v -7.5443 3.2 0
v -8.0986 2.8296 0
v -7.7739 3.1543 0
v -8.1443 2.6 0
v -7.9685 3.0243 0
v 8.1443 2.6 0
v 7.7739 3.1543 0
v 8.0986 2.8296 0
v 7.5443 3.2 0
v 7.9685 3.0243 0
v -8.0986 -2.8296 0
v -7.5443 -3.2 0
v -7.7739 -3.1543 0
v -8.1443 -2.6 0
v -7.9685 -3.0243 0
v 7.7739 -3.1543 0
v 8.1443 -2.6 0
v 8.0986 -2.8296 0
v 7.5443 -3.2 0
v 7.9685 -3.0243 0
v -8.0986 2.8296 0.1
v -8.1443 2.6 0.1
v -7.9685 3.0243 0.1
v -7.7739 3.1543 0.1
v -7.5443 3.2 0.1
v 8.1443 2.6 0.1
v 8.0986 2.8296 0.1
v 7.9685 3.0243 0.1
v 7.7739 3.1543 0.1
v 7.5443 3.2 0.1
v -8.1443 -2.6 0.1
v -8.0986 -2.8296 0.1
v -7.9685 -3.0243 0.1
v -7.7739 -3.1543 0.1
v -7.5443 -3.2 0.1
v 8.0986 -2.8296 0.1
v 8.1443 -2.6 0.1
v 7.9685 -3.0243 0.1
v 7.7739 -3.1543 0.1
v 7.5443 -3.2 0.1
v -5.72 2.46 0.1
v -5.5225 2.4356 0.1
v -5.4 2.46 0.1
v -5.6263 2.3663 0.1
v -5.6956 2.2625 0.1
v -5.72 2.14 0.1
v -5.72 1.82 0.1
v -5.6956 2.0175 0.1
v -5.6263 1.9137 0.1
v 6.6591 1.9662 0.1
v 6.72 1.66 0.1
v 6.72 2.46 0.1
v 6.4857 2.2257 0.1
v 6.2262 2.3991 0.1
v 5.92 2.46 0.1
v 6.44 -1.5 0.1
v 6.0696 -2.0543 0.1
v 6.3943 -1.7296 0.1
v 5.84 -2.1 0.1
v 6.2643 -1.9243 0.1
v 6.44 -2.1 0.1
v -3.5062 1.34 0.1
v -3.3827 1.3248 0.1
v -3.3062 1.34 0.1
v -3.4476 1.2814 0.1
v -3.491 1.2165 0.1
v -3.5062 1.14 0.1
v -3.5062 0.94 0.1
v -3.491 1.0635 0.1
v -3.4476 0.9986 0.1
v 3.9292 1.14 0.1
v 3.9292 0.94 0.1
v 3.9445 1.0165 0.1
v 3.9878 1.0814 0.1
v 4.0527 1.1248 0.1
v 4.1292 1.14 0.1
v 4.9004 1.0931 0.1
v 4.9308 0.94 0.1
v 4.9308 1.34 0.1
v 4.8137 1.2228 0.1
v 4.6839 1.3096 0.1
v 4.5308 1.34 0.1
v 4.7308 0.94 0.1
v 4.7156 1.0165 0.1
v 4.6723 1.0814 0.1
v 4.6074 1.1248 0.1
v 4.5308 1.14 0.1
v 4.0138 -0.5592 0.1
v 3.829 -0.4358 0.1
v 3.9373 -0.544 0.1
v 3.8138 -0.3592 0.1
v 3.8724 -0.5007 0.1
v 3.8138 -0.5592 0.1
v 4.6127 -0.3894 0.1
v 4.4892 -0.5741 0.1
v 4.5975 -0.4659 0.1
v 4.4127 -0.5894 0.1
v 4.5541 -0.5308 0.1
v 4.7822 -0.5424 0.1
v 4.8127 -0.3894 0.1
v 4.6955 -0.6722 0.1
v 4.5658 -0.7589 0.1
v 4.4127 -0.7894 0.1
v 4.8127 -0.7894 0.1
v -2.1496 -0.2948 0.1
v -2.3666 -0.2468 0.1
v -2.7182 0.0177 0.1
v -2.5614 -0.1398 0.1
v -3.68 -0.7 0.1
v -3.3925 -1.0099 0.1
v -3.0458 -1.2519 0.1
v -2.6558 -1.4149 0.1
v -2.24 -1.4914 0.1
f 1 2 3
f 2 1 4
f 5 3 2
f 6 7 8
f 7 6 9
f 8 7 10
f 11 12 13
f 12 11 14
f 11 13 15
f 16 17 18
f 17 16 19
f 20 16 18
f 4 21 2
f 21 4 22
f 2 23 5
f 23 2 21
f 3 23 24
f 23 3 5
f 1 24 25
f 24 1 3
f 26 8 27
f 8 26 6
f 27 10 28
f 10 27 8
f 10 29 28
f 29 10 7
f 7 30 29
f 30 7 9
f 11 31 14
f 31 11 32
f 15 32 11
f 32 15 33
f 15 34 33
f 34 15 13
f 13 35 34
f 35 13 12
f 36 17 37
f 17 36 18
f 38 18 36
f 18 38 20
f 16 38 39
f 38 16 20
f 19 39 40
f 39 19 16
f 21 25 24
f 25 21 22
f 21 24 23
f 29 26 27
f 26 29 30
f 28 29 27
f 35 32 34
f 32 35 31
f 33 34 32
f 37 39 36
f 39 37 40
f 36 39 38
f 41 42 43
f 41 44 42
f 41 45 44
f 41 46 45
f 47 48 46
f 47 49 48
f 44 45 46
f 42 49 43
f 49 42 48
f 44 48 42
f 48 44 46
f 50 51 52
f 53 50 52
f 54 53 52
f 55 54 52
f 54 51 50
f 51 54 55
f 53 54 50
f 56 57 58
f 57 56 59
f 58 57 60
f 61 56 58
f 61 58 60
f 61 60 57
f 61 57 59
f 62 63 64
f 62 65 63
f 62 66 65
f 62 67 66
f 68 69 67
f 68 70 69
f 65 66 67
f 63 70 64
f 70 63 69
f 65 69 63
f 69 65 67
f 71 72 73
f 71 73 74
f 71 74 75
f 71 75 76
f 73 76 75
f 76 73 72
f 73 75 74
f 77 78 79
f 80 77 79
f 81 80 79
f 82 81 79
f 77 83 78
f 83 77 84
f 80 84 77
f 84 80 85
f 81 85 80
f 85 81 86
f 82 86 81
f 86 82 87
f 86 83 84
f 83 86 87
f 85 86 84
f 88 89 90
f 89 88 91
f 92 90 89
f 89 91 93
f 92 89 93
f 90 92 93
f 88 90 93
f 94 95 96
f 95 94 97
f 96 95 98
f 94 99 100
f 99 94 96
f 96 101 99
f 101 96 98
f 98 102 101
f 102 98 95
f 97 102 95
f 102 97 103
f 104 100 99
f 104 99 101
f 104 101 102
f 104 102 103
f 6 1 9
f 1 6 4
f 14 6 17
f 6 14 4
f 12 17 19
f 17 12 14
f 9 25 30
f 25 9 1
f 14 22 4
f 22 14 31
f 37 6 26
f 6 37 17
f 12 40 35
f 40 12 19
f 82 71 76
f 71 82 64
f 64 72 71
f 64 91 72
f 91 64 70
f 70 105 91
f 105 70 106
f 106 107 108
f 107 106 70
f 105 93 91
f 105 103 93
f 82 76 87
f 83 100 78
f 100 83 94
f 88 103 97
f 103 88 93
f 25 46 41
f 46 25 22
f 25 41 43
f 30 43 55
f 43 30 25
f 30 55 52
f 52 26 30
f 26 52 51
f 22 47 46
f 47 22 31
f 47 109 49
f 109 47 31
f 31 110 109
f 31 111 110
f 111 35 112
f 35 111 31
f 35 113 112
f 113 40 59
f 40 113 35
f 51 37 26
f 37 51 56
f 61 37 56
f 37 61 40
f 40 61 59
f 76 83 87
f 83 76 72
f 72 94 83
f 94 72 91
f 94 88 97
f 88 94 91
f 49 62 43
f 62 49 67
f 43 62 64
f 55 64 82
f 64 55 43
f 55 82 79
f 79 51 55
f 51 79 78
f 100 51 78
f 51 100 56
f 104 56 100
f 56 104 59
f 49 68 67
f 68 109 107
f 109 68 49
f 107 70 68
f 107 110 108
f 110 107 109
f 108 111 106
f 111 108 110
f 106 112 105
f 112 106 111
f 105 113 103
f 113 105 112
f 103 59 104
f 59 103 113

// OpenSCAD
// file: ../p/3-8ndis.scad
use <../lib.scad>
function ldraw_lib__3_8ndis() = [
// 0 Disc Negative 0.375
// 0 Name: 3-8ndis.dat
// 0 Author: Alex Taylor [anathema]
// 0 !LDRAW_ORG Primitive UPDATE 2009-02
// 0 !LICENSE Licensed under CC BY 2.0 and CC BY 4.0 : see CAreadme.txt
// 
// 0 BFC CERTIFY CCW
  [0,"BFC","CERTIFY"],
  [0,"BFC","CCW"],
// 
// 0 !HISTORY 2009-09-03 [PTadmin] Official Update 2009-02
// 
// 
// 3 16 1 0 1 0.9239 0 0.3827 1 0 0
  [3,16,1,0,1,0.9239,0,0.3827,1,0,0],
// 3 16 1 0 1 0.7071 0 0.7071 0.9239 0 0.3827
  [3,16,1,0,1,0.7071,0,0.7071,0.9239,0,0.3827],
// 3 16 1 0 1 0.3827 0 0.9239 0.7071 0 0.7071
  [3,16,1,0,1,0.3827,0,0.9239,0.7071,0,0.7071],
// 3 16 1 0 1 0 0 1 0.3827 0 0.9239
  [3,16,1,0,1,0,0,1,0.3827,0,0.9239],
// 3 16 -1 0 1 -0.3827 0 0.9239 0 0 1
  [3,16,-1,0,1,-0.3827,0,0.9239,0,0,1],
// 3 16 -1 0 1 -0.7071 0 0.7071 -0.3827 0 0.9239
  [3,16,-1,0,1,-0.7071,0,0.7071,-0.3827,0,0.9239],
// 0
];
makepoly(ldraw_lib__3_8ndis(), line=0.2);
// file: ../p/3-8chrd.scad
use <../lib.scad>
function ldraw_lib__3_8chrd() = [
// 0 Chord 0.375
// 0 Name: 3-8chrd.dat
// 0 Author: Donald Sutter [technog]
// 0 !LDRAW_ORG Primitive UPDATE 2005-01
// 0 !LICENSE Licensed under CC BY 2.0 and CC BY 4.0 : see CAreadme.txt
// 
// 0 BFC CERTIFY CCW
  [0,"BFC","CERTIFY"],
  [0,"BFC","CCW"],
// 
// 0 !HISTORY 2004-01-07 [Steffen] added primitive code for POVray
// 0 !HISTORY 2004-03-18 [mkennedy] removed pov code and rearanged polygons.
// 0 !HISTORY 2004-09-12 [cwdee] reversed winding and standardised precision
// 0 !HISTORY 2005-12-28 [PTadmin] Official Update 2005-01
// 0 !HISTORY 2007-06-24 [PTadmin] Header formatted for Contributor Agreement
// 0 !HISTORY 2008-07-01 [PTadmin] Official Update 2008-01
// 
// 
// 3 16 0.7071 0 0.7071 0.3827 0 0.9239 0 0 1
  [3,16,0.7071,0,0.7071,0.3827,0,0.9239,0,0,1],
// 4 16 0.9239 0 0.3827 -0.3827 0 0.9239 -0.7071 0 0.7071 1 0 0
  [4,16,0.9239,0,0.3827,-0.3827,0,0.9239,-0.7071,0,0.7071,1,0,0],
// 4 16 0.7071 0 0.7071 0 0 1 -0.3827 0 0.9239 0.9239 0 0.3827
  [4,16,0.7071,0,0.7071,0,0,1,-0.3827,0,0.9239,0.9239,0,0.3827],
// 0
];
makepoly(ldraw_lib__3_8chrd(), line=0.2);
// file: ../p/1-4ring1.scad
use <../lib.scad>
function ldraw_lib__1_4ring1() = [
// 0 Ring  1 x 0.25
// 0 Name: 1-4ring1.dat
// 0 Author: Chris Dee [cwdee]
// 0 !LDRAW_ORG Primitive UPDATE 2012-01
// 0 !LICENSE Licensed under CC BY 2.0 and CC BY 4.0 : see CAreadme.txt
// 
// 0 BFC CERTIFY CCW
  [0,"BFC","CERTIFY"],
  [0,"BFC","CCW"],
// 
// 0 !HISTORY 2000-05-07 [PTadmin] Official Update 2000-01
// 0 !HISTORY 2002-11-22 [hafhead] Added BFC statement
// 0 !HISTORY 2002-11-30 [PTadmin] Official Update 2002-05
// 0 !HISTORY 2007-06-22 [PTadmin] Header formatted for Contributor Agreement
// 0 !HISTORY 2008-07-01 [PTadmin] Official Update 2008-01
// 0 !HISTORY 2012-02-16 [Philo] Changed to CCW
// 0 !HISTORY 2012-03-30 [PTadmin] Official Update 2012-01
// 
// 
// 4 16 2 0 0 1.8478 0 0.7654 0.9239 0 0.3827 1 0 0
  [4,16,2,0,0,1.8478,0,0.7654,0.9239,0,0.3827,1,0,0],
// 4 16 1.8478 0 0.7654 1.4142 0 1.4142 0.7071 0 0.7071 0.9239 0 0.3827
  [4,16,1.8478,0,0.7654,1.4142,0,1.4142,0.7071,0,0.7071,0.9239,0,0.3827],
// 4 16 1.4142 0 1.4142 0.7654 0 1.8478 0.3827 0 0.9239 0.7071 0 0.7071
  [4,16,1.4142,0,1.4142,0.7654,0,1.8478,0.3827,0,0.9239,0.7071,0,0.7071],
// 4 16 0.7654 0 1.8478 0 0 2 0 0 1 0.3827 0 0.9239
  [4,16,0.7654,0,1.8478,0,0,2,0,0,1,0.3827,0,0.9239],
];
makepoly(ldraw_lib__1_4ring1(), line=0.2);
// file: ../p/1-4ndis.scad
use <../lib.scad>
function ldraw_lib__1_4ndis() = [
// 0 Disc Negative 0.25
// 0 Name: 1-4ndis.dat
// 0 Author: James Jessiman
// 0 !LDRAW_ORG Primitive UPDATE 2012-01
// 0 !LICENSE Licensed under CC BY 2.0 and CC BY 4.0 : see CAreadme.txt
// 
// 0 BFC CERTIFY CCW
  [0,"BFC","CERTIFY"],
  [0,"BFC","CCW"],
// 
// 0 !HISTORY 2002-03-23 [sbliss] Added BFC Statement
// 0 !HISTORY 2002-04-25 [PTadmin] Official Update 2002-02
// 0 !HISTORY 2007-06-22 [PTadmin] Header formatted for Contributor Agreement
// 0 !HISTORY 2008-07-01 [PTadmin] Official Update 2008-01
// 0 !HISTORY 2012-02-16 [Philo] Changed to CCW
// 0 !HISTORY 2012-03-30 [PTadmin] Official Update 2012-01
// 
// 
// 3 16 0.9239 0 0.3827 1 0 0 1 0 1
  [3,16,0.9239,0,0.3827,1,0,0,1,0,1],
// 3 16 0.7071 0 0.7071 0.9239 0 0.3827 1 0 1
  [3,16,0.7071,0,0.7071,0.9239,0,0.3827,1,0,1],
// 3 16 0.3827 0 0.9239 0.7071 0 0.7071 1 0 1
  [3,16,0.3827,0,0.9239,0.7071,0,0.7071,1,0,1],
// 3 16 0 0 1 0.3827 0 0.9239 1 0 1
  [3,16,0,0,1,0.3827,0,0.9239,1,0,1],
];
makepoly(ldraw_lib__1_4ndis(), line=0.2);
// file: ../p/1-4cyli.scad
use <../lib.scad>
function ldraw_lib__1_4cyli() = [
// 0 Cylinder 0.25
// 0 Name: 1-4cyli.dat
// 0 Author: James Jessiman
// 0 !LDRAW_ORG Primitive UPDATE 2012-01
// 0 !LICENSE Licensed under CC BY 2.0 and CC BY 4.0 : see CAreadme.txt
// 
// 0 BFC CERTIFY CCW
  [0,"BFC","CERTIFY"],
  [0,"BFC","CCW"],
// 
// 0 !HISTORY 2002-03-23 [sbliss] Added BFC statement.
// 0 !HISTORY 2002-04-25 [PTadmin] Official Update 2002-02
// 0 !HISTORY 2007-06-22 [PTadmin] Header formatted for Contributor Agreement
// 0 !HISTORY 2008-07-01 [PTadmin] Official Update 2008-01
// 0 !HISTORY 2012-02-16 [Philo] Changed to CCW
// 0 !HISTORY 2012-03-30 [PTadmin] Official Update 2012-01
// 
// 
// 4 16 1 1 0 0.9239 1 0.3827 0.9239 0 0.3827 1 0 0
  [4,16,1,1,0,0.9239,1,0.3827,0.9239,0,0.3827,1,0,0],
// 5 24 1 0 0 1 1 0 0.9239 0 0.3827 1 0 -1
  [5,24,1,0,0,1,1,0,0.9239,0,0.3827,1,0,-1],
// 4 16 0.9239 1 0.3827 0.7071 1 0.7071 0.7071 0 0.7071 0.9239 0 0.3827
  [4,16,0.9239,1,0.3827,0.7071,1,0.7071,0.7071,0,0.7071,0.9239,0,0.3827],
// 5 24 0.9239 0 0.3827 0.9239 1 0.3827 0.7071 0 0.7071 1 0 0
  [5,24,0.9239,0,0.3827,0.9239,1,0.3827,0.7071,0,0.7071,1,0,0],
// 4 16 0.7071 1 0.7071 0.3827 1 0.9239 0.3827 0 0.9239 0.7071 0 0.7071
  [4,16,0.7071,1,0.7071,0.3827,1,0.9239,0.3827,0,0.9239,0.7071,0,0.7071],
// 5 24 0.7071 0 0.7071 0.7071 1 0.7071 0.3827 0 0.9239 0.9239 0 0.3827
  [5,24,0.7071,0,0.7071,0.7071,1,0.7071,0.3827,0,0.9239,0.9239,0,0.3827],
// 4 16 0.3827 1 0.9239 0 1 1 0 0 1 0.3827 0 0.9239
  [4,16,0.3827,1,0.9239,0,1,1,0,0,1,0.3827,0,0.9239],
// 5 24 0.3827 0 0.9239 0.3827 1 0.9239 0 0 1 0.7071 0 0.7071
  [5,24,0.3827,0,0.9239,0.3827,1,0.9239,0,0,1,0.7071,0,0.7071],
// 5 24 0 0 1 0 1 1 0.3827 0 0.9239 -1 0 1
  [5,24,0,0,1,0,1,1,0.3827,0,0.9239,-1,0,1],
];
makepoly(ldraw_lib__1_4cyli(), line=0.2);
// file: ../p/1-4chrd.scad
use <../lib.scad>
function ldraw_lib__1_4chrd() = [
// 0 Chord 0.25
// 0 Name: 1-4chrd.dat
// 0 Author: Tony Hafner [hafhead]
// 0 !LDRAW_ORG Primitive UPDATE 2012-02
// 0 !LICENSE Licensed under CC BY 2.0 and CC BY 4.0 : see CAreadme.txt
// 
// 0 BFC CERTIFY CCW
  [0,"BFC","CERTIFY"],
  [0,"BFC","CCW"],
// 
// 0 !HISTORY 2004-04-22 [PTadmin] Official Update 2004-02
// 0 !HISTORY 2007-10-09 [PTadmin] Header formatted for Contributor Agreement
// 0 !HISTORY 2008-07-01 [PTadmin] Official Update 2008-01
// 0 !HISTORY 2012-08-02 [MMR1988] Re-creation with PrimGen2 and Rectifier
// 0 !HISTORY 2012-08-09 [PTadmin] Official Update 2012-02
// 
// 
// 4 16 0.9239 0 0.3827 0.3827 0 0.9239 0 0 1 1 0 0
  [4,16,0.9239,0,0.3827,0.3827,0,0.9239,0,0,1,1,0,0],
// 3 16 0.7071 0 0.7071 0.3827 0 0.9239 0.9239 0 0.3827
  [3,16,0.7071,0,0.7071,0.3827,0,0.9239,0.9239,0,0.3827],
];
makepoly(ldraw_lib__1_4chrd(), line=0.2);
// main file
use <../lib.scad>
use <../p/1-4chrd.scad>
use <../p/1-4cyli.scad>
use <../p/1-4ndis.scad>
use <../p/1-4ring1.scad>
use <../p/3-8chrd.scad>
use <../p/3-8ndis.scad>
function ldraw_lib__6141875h() = [
// 0 Sticker  0.8 x  2.0 with Dark Bluish Grey Air Vent on Black Background Right
// 0 Name: 6141875h.dat
// 0 Author: Massimo Maso [Sirio]
// 0 !LDRAW_ORG Part UPDATE 2022-06
// 0 !LICENSE Licensed under CC BY 2.0 and CC BY 4.0 : see CAreadme.txt
// 
// 0 BFC CERTIFY CCW
  [0,"BFC","CERTIFY"],
  [0,"BFC","CCW"],
// 
// 0 !KEYWORDS Bricklink 75875stk01, Brickowl 53567, F-150, Ford, Raptor
// 0 !KEYWORDS Rebrickable 24760, Set 75875, Speed Champions
// 
// 0 !HISTORY 2022-12-20 [PTadmin] Official Update 2022-06
// 
// 
// 0 // Primitives
// 
// 1 16 -18.8607 0 6.5 -1.5 0 0 0 -1 0 0 0 1.5 1-4chrd.dat
  [1,16,-18.8607,0,6.5,-1.5,0,0,0,-1,0,0,0,1.5, ldraw_lib__1_4chrd()],
// 1 16 18.8607 0 6.5 1.5 0 0 0 -1 0 0 0 1.5 1-4chrd.dat
  [1,16,18.8607,0,6.5,1.5,0,0,0,-1,0,0,0,1.5, ldraw_lib__1_4chrd()],
// 1 16 -18.8607 0 -6.5 -1.5 0 0 0 -1 0 0 0 -1.5 1-4chrd.dat
  [1,16,-18.8607,0,-6.5,-1.5,0,0,0,-1,0,0,0,-1.5, ldraw_lib__1_4chrd()],
// 1 16 18.8607 0 -6.5 1.5 0 0 0 -1 0 0 0 -1.5 1-4chrd.dat
  [1,16,18.8607,0,-6.5,1.5,0,0,0,-1,0,0,0,-1.5, ldraw_lib__1_4chrd()],
// 1 16 -18.8607 0 6.5 -1.5 0 0 0 -.25 0 0 0 1.5 1-4cyli.dat
  [1,16,-18.8607,0,6.5,-1.5,0,0,0,-.25,0,0,0,1.5, ldraw_lib__1_4cyli()],
// 1 16 18.8607 0 6.5 1.5 0 0 0 -.25 0 0 0 1.5 1-4cyli.dat
  [1,16,18.8607,0,6.5,1.5,0,0,0,-.25,0,0,0,1.5, ldraw_lib__1_4cyli()],
// 1 16 -18.8607 0 -6.5 -1.5 0 0 0 -.25 0 0 0 -1.5 1-4cyli.dat
  [1,16,-18.8607,0,-6.5,-1.5,0,0,0,-.25,0,0,0,-1.5, ldraw_lib__1_4cyli()],
// 1 16 18.8607 0 -6.5 1.5 0 0 0 -.25 0 0 0 -1.5 1-4cyli.dat
  [1,16,18.8607,0,-6.5,1.5,0,0,0,-.25,0,0,0,-1.5, ldraw_lib__1_4cyli()],
// 1 0 -18.8607 -.25 6.5 -1.5 0 0 0 1 0 0 0 1.5 1-4chrd.dat
  [1,0,-18.8607,-.25,6.5,-1.5,0,0,0,1,0,0,0,1.5, ldraw_lib__1_4chrd()],
// 1 0 18.8607 -.25 6.5 1.5 0 0 0 1 0 0 0 1.5 1-4chrd.dat
  [1,0,18.8607,-.25,6.5,1.5,0,0,0,1,0,0,0,1.5, ldraw_lib__1_4chrd()],
// 1 0 -18.8607 -.25 -6.5 -1.5 0 0 0 1 0 0 0 -1.5 1-4chrd.dat
  [1,0,-18.8607,-.25,-6.5,-1.5,0,0,0,1,0,0,0,-1.5, ldraw_lib__1_4chrd()],
// 1 0 18.8607 -.25 -6.5 1.5 0 0 0 1 0 0 0 -1.5 1-4chrd.dat
  [1,0,18.8607,-.25,-6.5,1.5,0,0,0,1,0,0,0,-1.5, ldraw_lib__1_4chrd()],
// 1 0 -13.5 -.25 5.35 0 0 -.8 0 1 0 .8 0 0 3-8ndis.dat
  [1,0,-13.5,-.25,5.35,0,0,-.8,0,1,0,.8,0,0, ldraw_lib__3_8ndis()],
// 1 72 -13.5 -.25 5.35 0 0 -.8 0 1 0 .8 0 0 3-8chrd.dat
  [1,72,-13.5,-.25,5.35,0,0,-.8,0,1,0,.8,0,0, ldraw_lib__3_8chrd()],
// 1 0 14.8 -.25 4.15 2 0 0 0 1 0 0 0 2 1-4ndis.dat
  [1,0,14.8,-.25,4.15,2,0,0,0,1,0,0,0,2, ldraw_lib__1_4ndis()],
// 1 72 14.8 -.25 4.15 2 0 0 0 1 0 0 0 2 1-4chrd.dat
  [1,72,14.8,-.25,4.15,2,0,0,0,1,0,0,0,2, ldraw_lib__1_4chrd()],
// 1 72 14.6 -.25 -3.75 1.5 0 0 0 1 0 0 0 -1.5 1-4chrd.dat
  [1,72,14.6,-.25,-3.75,1.5,0,0,0,1,0,0,0,-1.5, ldraw_lib__1_4chrd()],
// 1 0 14.6 -.25 -3.75 1.5 0 0 0 1 0 0 0 -1.5 1-4ndis.dat
  [1,0,14.6,-.25,-3.75,1.5,0,0,0,1,0,0,0,-1.5, ldraw_lib__1_4ndis()],
// 1 72 -8.2655 -.25 2.85 0 0 -.5 0 1 0 .5 0 0 3-8ndis.dat
  [1,72,-8.2655,-.25,2.85,0,0,-.5,0,1,0,.5,0,0, ldraw_lib__3_8ndis()],
// 1 0 -8.2655 -.25 2.85 0 0 -.5 0 1 0 .5 0 0 3-8chrd.dat
  [1,0,-8.2655,-.25,2.85,0,0,-.5,0,1,0,.5,0,0, ldraw_lib__3_8chrd()],
// 1 0 10.3231 -.25 2.35 -.5 0 0 0 1 0 0 0 .5 1-4ndis.dat
  [1,0,10.3231,-.25,2.35,-.5,0,0,0,1,0,0,0,.5, ldraw_lib__1_4ndis()],
// 1 72 10.3231 -.25 2.35 -.5 0 0 0 1 0 0 0 .5 1-4chrd.dat
  [1,72,10.3231,-.25,2.35,-.5,0,0,0,1,0,0,0,.5, ldraw_lib__1_4chrd()],
// 1 72 11.3271 -.25 2.35 1 0 0 0 1 0 0 0 1 1-4ndis.dat
  [1,72,11.3271,-.25,2.35,1,0,0,0,1,0,0,0,1, ldraw_lib__1_4ndis()],
// 1 0 11.3271 -.25 2.35 .5 0 0 0 1 0 0 0 .5 1-4ring1.dat
  [1,0,11.3271,-.25,2.35,.5,0,0,0,1,0,0,0,.5, ldraw_lib__1_4ring1()],
// 1 72 11.3271 -.25 2.35 .5 0 0 0 1 0 0 0 .5 1-4chrd.dat
  [1,72,11.3271,-.25,2.35,.5,0,0,0,1,0,0,0,.5, ldraw_lib__1_4chrd()],
// 1 72 10.0345 -.25 -.8981 -.5 0 0 0 1 0 0 0 -.5 1-4chrd.dat
  [1,72,10.0345,-.25,-.8981,-.5,0,0,0,1,0,0,0,-.5, ldraw_lib__1_4chrd()],
// 1 0 10.0345 -.25 -.8981 -.5 0 0 0 1 0 0 0 -.5 1-4ndis.dat
  [1,0,10.0345,-.25,-.8981,-.5,0,0,0,1,0,0,0,-.5, ldraw_lib__1_4ndis()],
// 1 72 11.0317 -.25 -.9734 .5 0 0 0 1 0 0 0 -.5 1-4chrd.dat
  [1,72,11.0317,-.25,-.9734,.5,0,0,0,1,0,0,0,-.5, ldraw_lib__1_4chrd()],
// 1 0 11.0317 -.25 -.9734 .5 0 0 0 1 0 0 0 -.5 1-4ring1.dat
  [1,0,11.0317,-.25,-.9734,.5,0,0,0,1,0,0,0,-.5, ldraw_lib__1_4ring1()],
// 1 72 11.0317 -.25 -.9734 1 0 0 0 1 0 0 0 -1 1-4ndis.dat
  [1,72,11.0317,-.25,-.9734,1,0,0,0,1,0,0,0,-1, ldraw_lib__1_4ndis()],
// 0 // Bottom face
// 4 16 18.8607 0 8 20.3607 0 6.5 -20.3607 0 6.5 -18.8607 0 8
  [4,16,18.8607,0,8,20.3607,0,6.5,-20.3607,0,6.5,-18.8607,0,8],
// 4 16 20.3607 0 6.5 20.3607 0 -6.5 -20.3607 0 -6.5 -20.3607 0 6.5
  [4,16,20.3607,0,6.5,20.3607,0,-6.5,-20.3607,0,-6.5,-20.3607,0,6.5],
// 4 16 18.8607 0 -8 -18.8607 0 -8 -20.3607 0 -6.5 20.3607 0 -6.5
  [4,16,18.8607,0,-8,-18.8607,0,-8,-20.3607,0,-6.5,20.3607,0,-6.5],
// 0 // Lateral face
// 4 16 -18.8607 0 8 -18.8607 -.25 8 18.8607 -.25 8 18.8607 0 8
  [4,16,-18.8607,0,8,-18.8607,-.25,8,18.8607,-.25,8,18.8607,0,8],
// 4 16 -20.3607 0 6.5 -20.3607 0 -6.5 -20.3607 -.25 -6.5 -20.3607 -.25 6.5
  [4,16,-20.3607,0,6.5,-20.3607,0,-6.5,-20.3607,-.25,-6.5,-20.3607,-.25,6.5],
// 4 16 20.3607 0 6.5 20.3607 -.25 6.5 20.3607 -.25 -6.5 20.3607 0 -6.5
  [4,16,20.3607,0,6.5,20.3607,-.25,6.5,20.3607,-.25,-6.5,20.3607,0,-6.5],
// 4 16 -18.8607 0 -8 18.8607 0 -8 18.8607 -.25 -8 -18.8607 -.25 -8
  [4,16,-18.8607,0,-8,18.8607,0,-8,18.8607,-.25,-8,-18.8607,-.25,-8],
// 0 // Top face
// 0 // Inner black faces
// 4 0 -8.2655 -.25 3.35 9.8231 -.25 2.85 10.3231 -.25 2.85 11.3271 -.25 3.35
  [4,0,-8.2655,-.25,3.35,9.8231,-.25,2.85,10.3231,-.25,2.85,11.3271,-.25,3.35],
// 3 0 -8.2655 -.25 3.35 9.8231 -.25 2.35 9.8231 -.25 2.85
  [3,0,-8.2655,-.25,3.35,9.8231,-.25,2.35,9.8231,-.25,2.85],
// 4 0 -8.2655 -.25 3.35 -8.61905 -.25 2.49645 9.5345 -.25 -.8981 9.8231 -.25 2.35
  [4,0,-8.2655,-.25,3.35,-8.61905,-.25,2.49645,9.5345,-.25,-.8981,9.8231,-.25,2.35],
// 4 0 -8.61905 -.25 2.49645 -5.9166 -.25 -.6171 -5.3741 -.25 -.7371 9.5345 -.25 -.8981
  [4,0,-8.61905,-.25,2.49645,-5.9166,-.25,-.6171,-5.3741,-.25,-.7371,9.5345,-.25,-.8981],
// 4 0 -8.61905 -.25 2.49645 -6.7956 -.25 .0442 -6.4035 -.25 -.3495 -5.9166 -.25 -.6171
  [4,0,-8.61905,-.25,2.49645,-6.7956,-.25,.0442,-6.4035,-.25,-.3495,-5.9166,-.25,-.6171],
// 3 0 -5.3741 -.25 -.7371 9.5345 -.25 -1.3981 9.5345 -.25 -.8981
  [3,0,-5.3741,-.25,-.7371,9.5345,-.25,-1.3981,9.5345,-.25,-.8981],
// 3 0 -5.3741 -.25 -.7371 11.0317 -.25 -1.9734 9.5345 -.25 -1.3981
  [3,0,-5.3741,-.25,-.7371,11.0317,-.25,-1.9734,9.5345,-.25,-1.3981],
// 3 0 11.3271 -.25 3.35 10.3231 -.25 2.85 11.3271 -.25 2.85
  [3,0,11.3271,-.25,3.35,10.3231,-.25,2.85,11.3271,-.25,2.85],
// 4 0 11.8271 -.25 2.35 11.5317 -.25 -.9734 12.0317 -.25 -.9734 12.3271 -.25 2.35
  [4,0,11.8271,-.25,2.35,11.5317,-.25,-.9734,12.0317,-.25,-.9734,12.3271,-.25,2.35],
// 4 0 11.0317 -.25 -1.4734 10.0345 -.25 -1.3981 9.5345 -.25 -1.3981 11.0317 -.25 -1.9734
  [4,0,11.0317,-.25,-1.4734,10.0345,-.25,-1.3981,9.5345,-.25,-1.3981,11.0317,-.25,-1.9734],
// 0 // Outer black faces
// 4 0 -18.8607 -.25 8 -20.3607 -.25 6.5 -14.3 -.25 5.35 -14.3 -.25 6.15
  [4,0,-18.8607,-.25,8,-20.3607,-.25,6.5,-14.3,-.25,5.35,-14.3,-.25,6.15],
// 3 0 -18.8607 -.25 8 -14.3 -.25 6.15 -13.5 -.25 6.15
  [3,0,-18.8607,-.25,8,-14.3,-.25,6.15,-13.5,-.25,6.15],
// 4 0 -18.8607 -.25 8 -13.5 -.25 6.15 14.8 -.25 6.15 18.8607 -.25 8
  [4,0,-18.8607,-.25,8,-13.5,-.25,6.15,14.8,-.25,6.15,18.8607,-.25,8],
// 3 0 18.8607 -.25 8 14.8 -.25 6.15 16.8 -.25 6.15
  [3,0,18.8607,-.25,8,14.8,-.25,6.15,16.8,-.25,6.15],
// 4 0 18.8607 -.25 8 16.8 -.25 6.15 16.8 -.25 4.15 20.3607 -.25 6.5
  [4,0,18.8607,-.25,8,16.8,-.25,6.15,16.8,-.25,4.15,20.3607,-.25,6.5],
// 4 0 -20.3607 -.25 -6.5 -14.3 -.25 4.55 -14.3 -.25 5.35 -20.3607 -.25 6.5
  [4,0,-20.3607,-.25,-6.5,-14.3,-.25,4.55,-14.3,-.25,5.35,-20.3607,-.25,6.5],
// 4 0 -20.3607 -.25 -6.5 -9.2 -.25 -1.75 -14.06568 -.25 4.78432 -14.3 -.25 4.55
  [4,0,-20.3607,-.25,-6.5,-9.2,-.25,-1.75,-14.06568,-.25,4.78432,-14.3,-.25,4.55],
// 3 0 -20.3607 -.25 -6.5 -8.4812 -.25 -2.5248 -9.2 -.25 -1.75
  [3,0,-20.3607,-.25,-6.5,-8.4812,-.25,-2.5248,-9.2,-.25,-1.75],
// 3 0 -20.3607 -.25 -6.5 -7.6146 -.25 -3.1297 -8.4812 -.25 -2.5248
  [3,0,-20.3607,-.25,-6.5,-7.6146,-.25,-3.1297,-8.4812,-.25,-2.5248],
// 4 0 -20.3607 -.25 -6.5 -18.8607 -.25 -8 -6.6394 -.25 -3.5372 -7.6146 -.25 -3.1297
  [4,0,-20.3607,-.25,-6.5,-18.8607,-.25,-8,-6.6394,-.25,-3.5372,-7.6146,-.25,-3.1297],
// 3 0 -18.8607 -.25 -8 -5.6 -.25 -3.7286 -6.6394 -.25 -3.5372
  [3,0,-18.8607,-.25,-8,-5.6,-.25,-3.7286,-6.6394,-.25,-3.5372],
// 4 0 -18.8607 -.25 -8 18.8607 -.25 -8 14.6 -.25 -5.25 -5.6 -.25 -3.7286
  [4,0,-18.8607,-.25,-8,18.8607,-.25,-8,14.6,-.25,-5.25,-5.6,-.25,-3.7286],
// 4 0 20.3607 -.25 -6.5 20.3607 -.25 6.5 16.8 -.25 4.15 16.1 -.25 -3.75
  [4,0,20.3607,-.25,-6.5,20.3607,-.25,6.5,16.8,-.25,4.15,16.1,-.25,-3.75],
// 4 0 20.3607 -.25 -6.5 16.1 -.25 -3.75 16.1 -.25 -5.25 18.8607 -.25 -8
  [4,0,20.3607,-.25,-6.5,16.1,-.25,-3.75,16.1,-.25,-5.25,18.8607,-.25,-8],
// 3 0 18.8607 -.25 -8 16.1 -.25 -5.25 14.6 -.25 -5.25
  [3,0,18.8607,-.25,-8,16.1,-.25,-5.25,14.6,-.25,-5.25],
// 0 // Inner dark grey faces
// 4 72 9.8231 -.25 2.35 11.8271 -.25 2.35 11.3271 -.25 2.85 10.3231 -.25 2.85
  [4,72,9.8231,-.25,2.35,11.8271,-.25,2.35,11.3271,-.25,2.85,10.3231,-.25,2.85],
// 4 72 9.8231 -.25 2.35 9.5345 -.25 -.8981 11.5317 -.25 -.9734 11.8271 -.25 2.35
  [4,72,9.8231,-.25,2.35,9.5345,-.25,-.8981,11.5317,-.25,-.9734,11.8271,-.25,2.35],
// 4 72 9.5345 -.25 -.8981 10.0345 -.25 -1.3981 11.0317 -.25 -1.4734 11.5317 -.25 -.9734
  [4,72,9.5345,-.25,-.8981,10.0345,-.25,-1.3981,11.0317,-.25,-1.4734,11.5317,-.25,-.9734],
// 0 // Outer dark grey faces
// 4 72 -13.5 -.25 6.15 -14.06568 -.25 4.78432 -8.7655 -.25 2.85 -8.7655 -.25 3.35
  [4,72,-13.5,-.25,6.15,-14.06568,-.25,4.78432,-8.7655,-.25,2.85,-8.7655,-.25,3.35],
// 3 72 -13.5 -.25 6.15 -8.7655 -.25 3.35 -8.2655 -.25 3.35
  [3,72,-13.5,-.25,6.15,-8.7655,-.25,3.35,-8.2655,-.25,3.35],
// 4 72 -13.5 -.25 6.15 -8.2655 -.25 3.35 11.3271 -.25 3.35 14.8 -.25 6.15
  [4,72,-13.5,-.25,6.15,-8.2655,-.25,3.35,11.3271,-.25,3.35,14.8,-.25,6.15],
// 3 72 14.8 -.25 6.15 11.3271 -.25 3.35 12.3271 -.25 3.35
  [3,72,14.8,-.25,6.15,11.3271,-.25,3.35,12.3271,-.25,3.35],
// 4 72 14.8 -.25 6.15 12.3271 -.25 3.35 12.3271 -.25 2.35 16.8 -.25 4.15
  [4,72,14.8,-.25,6.15,12.3271,-.25,3.35,12.3271,-.25,2.35,16.8,-.25,4.15],
// 4 72 16.1 -.25 -3.75 16.8 -.25 4.15 12.3271 -.25 2.35 12.0317 -.25 -.9734
  [4,72,16.1,-.25,-3.75,16.8,-.25,4.15,12.3271,-.25,2.35,12.0317,-.25,-.9734],
// 4 72 16.1 -.25 -3.75 12.0317 -.25 -.9734 12.0317 -.25 -1.9734 14.6 -.25 -5.25
  [4,72,16.1,-.25,-3.75,12.0317,-.25,-.9734,12.0317,-.25,-1.9734,14.6,-.25,-5.25],
// 3 72 -14.06568 -.25 4.78432 -8.7655 -.25 2.35 -8.7655 -.25 2.85
  [3,72,-14.06568,-.25,4.78432,-8.7655,-.25,2.35,-8.7655,-.25,2.85],
// 4 72 -14.06568 -.25 4.78432 -9.2 -.25 -1.75 -6.7956 -.25 .0442 -8.7655 -.25 2.35
  [4,72,-14.06568,-.25,4.78432,-9.2,-.25,-1.75,-6.7956,-.25,.0442,-8.7655,-.25,2.35],
// 3 72 -6.7956 -.25 .0442 -8.61905 -.25 2.49645 -8.7655 -.25 2.35
  [3,72,-6.7956,-.25,.0442,-8.61905,-.25,2.49645,-8.7655,-.25,2.35],
// 4 72 -6.7956 -.25 .0442 -9.2 -.25 -1.75 -8.4812 -.25 -2.5248 -6.4035 -.25 -.3495
  [4,72,-6.7956,-.25,.0442,-9.2,-.25,-1.75,-8.4812,-.25,-2.5248,-6.4035,-.25,-.3495],
// 4 72 -5.9166 -.25 -.6171 -6.4035 -.25 -.3495 -8.4812 -.25 -2.5248 -7.6146 -.25 -3.1297
  [4,72,-5.9166,-.25,-.6171,-6.4035,-.25,-.3495,-8.4812,-.25,-2.5248,-7.6146,-.25,-3.1297],
// 4 72 -5.9166 -.25 -.6171 -7.6146 -.25 -3.1297 -6.6394 -.25 -3.5372 -5.3741 -.25 -.7371
  [4,72,-5.9166,-.25,-.6171,-7.6146,-.25,-3.1297,-6.6394,-.25,-3.5372,-5.3741,-.25,-.7371],
// 4 72 11.0317 -.25 -1.9734 -5.3741 -.25 -.7371 -6.6394 -.25 -3.5372 -5.6 -.25 -3.7286
  [4,72,11.0317,-.25,-1.9734,-5.3741,-.25,-.7371,-6.6394,-.25,-3.5372,-5.6,-.25,-3.7286],
// 4 72 11.0317 -.25 -1.9734 -5.6 -.25 -3.7286 14.6 -.25 -5.25 12.0317 -.25 -1.9734
  [4,72,11.0317,-.25,-1.9734,-5.6,-.25,-3.7286,14.6,-.25,-5.25,12.0317,-.25,-1.9734],
];
makepoly(ldraw_lib__6141875h(), line=0.2);
